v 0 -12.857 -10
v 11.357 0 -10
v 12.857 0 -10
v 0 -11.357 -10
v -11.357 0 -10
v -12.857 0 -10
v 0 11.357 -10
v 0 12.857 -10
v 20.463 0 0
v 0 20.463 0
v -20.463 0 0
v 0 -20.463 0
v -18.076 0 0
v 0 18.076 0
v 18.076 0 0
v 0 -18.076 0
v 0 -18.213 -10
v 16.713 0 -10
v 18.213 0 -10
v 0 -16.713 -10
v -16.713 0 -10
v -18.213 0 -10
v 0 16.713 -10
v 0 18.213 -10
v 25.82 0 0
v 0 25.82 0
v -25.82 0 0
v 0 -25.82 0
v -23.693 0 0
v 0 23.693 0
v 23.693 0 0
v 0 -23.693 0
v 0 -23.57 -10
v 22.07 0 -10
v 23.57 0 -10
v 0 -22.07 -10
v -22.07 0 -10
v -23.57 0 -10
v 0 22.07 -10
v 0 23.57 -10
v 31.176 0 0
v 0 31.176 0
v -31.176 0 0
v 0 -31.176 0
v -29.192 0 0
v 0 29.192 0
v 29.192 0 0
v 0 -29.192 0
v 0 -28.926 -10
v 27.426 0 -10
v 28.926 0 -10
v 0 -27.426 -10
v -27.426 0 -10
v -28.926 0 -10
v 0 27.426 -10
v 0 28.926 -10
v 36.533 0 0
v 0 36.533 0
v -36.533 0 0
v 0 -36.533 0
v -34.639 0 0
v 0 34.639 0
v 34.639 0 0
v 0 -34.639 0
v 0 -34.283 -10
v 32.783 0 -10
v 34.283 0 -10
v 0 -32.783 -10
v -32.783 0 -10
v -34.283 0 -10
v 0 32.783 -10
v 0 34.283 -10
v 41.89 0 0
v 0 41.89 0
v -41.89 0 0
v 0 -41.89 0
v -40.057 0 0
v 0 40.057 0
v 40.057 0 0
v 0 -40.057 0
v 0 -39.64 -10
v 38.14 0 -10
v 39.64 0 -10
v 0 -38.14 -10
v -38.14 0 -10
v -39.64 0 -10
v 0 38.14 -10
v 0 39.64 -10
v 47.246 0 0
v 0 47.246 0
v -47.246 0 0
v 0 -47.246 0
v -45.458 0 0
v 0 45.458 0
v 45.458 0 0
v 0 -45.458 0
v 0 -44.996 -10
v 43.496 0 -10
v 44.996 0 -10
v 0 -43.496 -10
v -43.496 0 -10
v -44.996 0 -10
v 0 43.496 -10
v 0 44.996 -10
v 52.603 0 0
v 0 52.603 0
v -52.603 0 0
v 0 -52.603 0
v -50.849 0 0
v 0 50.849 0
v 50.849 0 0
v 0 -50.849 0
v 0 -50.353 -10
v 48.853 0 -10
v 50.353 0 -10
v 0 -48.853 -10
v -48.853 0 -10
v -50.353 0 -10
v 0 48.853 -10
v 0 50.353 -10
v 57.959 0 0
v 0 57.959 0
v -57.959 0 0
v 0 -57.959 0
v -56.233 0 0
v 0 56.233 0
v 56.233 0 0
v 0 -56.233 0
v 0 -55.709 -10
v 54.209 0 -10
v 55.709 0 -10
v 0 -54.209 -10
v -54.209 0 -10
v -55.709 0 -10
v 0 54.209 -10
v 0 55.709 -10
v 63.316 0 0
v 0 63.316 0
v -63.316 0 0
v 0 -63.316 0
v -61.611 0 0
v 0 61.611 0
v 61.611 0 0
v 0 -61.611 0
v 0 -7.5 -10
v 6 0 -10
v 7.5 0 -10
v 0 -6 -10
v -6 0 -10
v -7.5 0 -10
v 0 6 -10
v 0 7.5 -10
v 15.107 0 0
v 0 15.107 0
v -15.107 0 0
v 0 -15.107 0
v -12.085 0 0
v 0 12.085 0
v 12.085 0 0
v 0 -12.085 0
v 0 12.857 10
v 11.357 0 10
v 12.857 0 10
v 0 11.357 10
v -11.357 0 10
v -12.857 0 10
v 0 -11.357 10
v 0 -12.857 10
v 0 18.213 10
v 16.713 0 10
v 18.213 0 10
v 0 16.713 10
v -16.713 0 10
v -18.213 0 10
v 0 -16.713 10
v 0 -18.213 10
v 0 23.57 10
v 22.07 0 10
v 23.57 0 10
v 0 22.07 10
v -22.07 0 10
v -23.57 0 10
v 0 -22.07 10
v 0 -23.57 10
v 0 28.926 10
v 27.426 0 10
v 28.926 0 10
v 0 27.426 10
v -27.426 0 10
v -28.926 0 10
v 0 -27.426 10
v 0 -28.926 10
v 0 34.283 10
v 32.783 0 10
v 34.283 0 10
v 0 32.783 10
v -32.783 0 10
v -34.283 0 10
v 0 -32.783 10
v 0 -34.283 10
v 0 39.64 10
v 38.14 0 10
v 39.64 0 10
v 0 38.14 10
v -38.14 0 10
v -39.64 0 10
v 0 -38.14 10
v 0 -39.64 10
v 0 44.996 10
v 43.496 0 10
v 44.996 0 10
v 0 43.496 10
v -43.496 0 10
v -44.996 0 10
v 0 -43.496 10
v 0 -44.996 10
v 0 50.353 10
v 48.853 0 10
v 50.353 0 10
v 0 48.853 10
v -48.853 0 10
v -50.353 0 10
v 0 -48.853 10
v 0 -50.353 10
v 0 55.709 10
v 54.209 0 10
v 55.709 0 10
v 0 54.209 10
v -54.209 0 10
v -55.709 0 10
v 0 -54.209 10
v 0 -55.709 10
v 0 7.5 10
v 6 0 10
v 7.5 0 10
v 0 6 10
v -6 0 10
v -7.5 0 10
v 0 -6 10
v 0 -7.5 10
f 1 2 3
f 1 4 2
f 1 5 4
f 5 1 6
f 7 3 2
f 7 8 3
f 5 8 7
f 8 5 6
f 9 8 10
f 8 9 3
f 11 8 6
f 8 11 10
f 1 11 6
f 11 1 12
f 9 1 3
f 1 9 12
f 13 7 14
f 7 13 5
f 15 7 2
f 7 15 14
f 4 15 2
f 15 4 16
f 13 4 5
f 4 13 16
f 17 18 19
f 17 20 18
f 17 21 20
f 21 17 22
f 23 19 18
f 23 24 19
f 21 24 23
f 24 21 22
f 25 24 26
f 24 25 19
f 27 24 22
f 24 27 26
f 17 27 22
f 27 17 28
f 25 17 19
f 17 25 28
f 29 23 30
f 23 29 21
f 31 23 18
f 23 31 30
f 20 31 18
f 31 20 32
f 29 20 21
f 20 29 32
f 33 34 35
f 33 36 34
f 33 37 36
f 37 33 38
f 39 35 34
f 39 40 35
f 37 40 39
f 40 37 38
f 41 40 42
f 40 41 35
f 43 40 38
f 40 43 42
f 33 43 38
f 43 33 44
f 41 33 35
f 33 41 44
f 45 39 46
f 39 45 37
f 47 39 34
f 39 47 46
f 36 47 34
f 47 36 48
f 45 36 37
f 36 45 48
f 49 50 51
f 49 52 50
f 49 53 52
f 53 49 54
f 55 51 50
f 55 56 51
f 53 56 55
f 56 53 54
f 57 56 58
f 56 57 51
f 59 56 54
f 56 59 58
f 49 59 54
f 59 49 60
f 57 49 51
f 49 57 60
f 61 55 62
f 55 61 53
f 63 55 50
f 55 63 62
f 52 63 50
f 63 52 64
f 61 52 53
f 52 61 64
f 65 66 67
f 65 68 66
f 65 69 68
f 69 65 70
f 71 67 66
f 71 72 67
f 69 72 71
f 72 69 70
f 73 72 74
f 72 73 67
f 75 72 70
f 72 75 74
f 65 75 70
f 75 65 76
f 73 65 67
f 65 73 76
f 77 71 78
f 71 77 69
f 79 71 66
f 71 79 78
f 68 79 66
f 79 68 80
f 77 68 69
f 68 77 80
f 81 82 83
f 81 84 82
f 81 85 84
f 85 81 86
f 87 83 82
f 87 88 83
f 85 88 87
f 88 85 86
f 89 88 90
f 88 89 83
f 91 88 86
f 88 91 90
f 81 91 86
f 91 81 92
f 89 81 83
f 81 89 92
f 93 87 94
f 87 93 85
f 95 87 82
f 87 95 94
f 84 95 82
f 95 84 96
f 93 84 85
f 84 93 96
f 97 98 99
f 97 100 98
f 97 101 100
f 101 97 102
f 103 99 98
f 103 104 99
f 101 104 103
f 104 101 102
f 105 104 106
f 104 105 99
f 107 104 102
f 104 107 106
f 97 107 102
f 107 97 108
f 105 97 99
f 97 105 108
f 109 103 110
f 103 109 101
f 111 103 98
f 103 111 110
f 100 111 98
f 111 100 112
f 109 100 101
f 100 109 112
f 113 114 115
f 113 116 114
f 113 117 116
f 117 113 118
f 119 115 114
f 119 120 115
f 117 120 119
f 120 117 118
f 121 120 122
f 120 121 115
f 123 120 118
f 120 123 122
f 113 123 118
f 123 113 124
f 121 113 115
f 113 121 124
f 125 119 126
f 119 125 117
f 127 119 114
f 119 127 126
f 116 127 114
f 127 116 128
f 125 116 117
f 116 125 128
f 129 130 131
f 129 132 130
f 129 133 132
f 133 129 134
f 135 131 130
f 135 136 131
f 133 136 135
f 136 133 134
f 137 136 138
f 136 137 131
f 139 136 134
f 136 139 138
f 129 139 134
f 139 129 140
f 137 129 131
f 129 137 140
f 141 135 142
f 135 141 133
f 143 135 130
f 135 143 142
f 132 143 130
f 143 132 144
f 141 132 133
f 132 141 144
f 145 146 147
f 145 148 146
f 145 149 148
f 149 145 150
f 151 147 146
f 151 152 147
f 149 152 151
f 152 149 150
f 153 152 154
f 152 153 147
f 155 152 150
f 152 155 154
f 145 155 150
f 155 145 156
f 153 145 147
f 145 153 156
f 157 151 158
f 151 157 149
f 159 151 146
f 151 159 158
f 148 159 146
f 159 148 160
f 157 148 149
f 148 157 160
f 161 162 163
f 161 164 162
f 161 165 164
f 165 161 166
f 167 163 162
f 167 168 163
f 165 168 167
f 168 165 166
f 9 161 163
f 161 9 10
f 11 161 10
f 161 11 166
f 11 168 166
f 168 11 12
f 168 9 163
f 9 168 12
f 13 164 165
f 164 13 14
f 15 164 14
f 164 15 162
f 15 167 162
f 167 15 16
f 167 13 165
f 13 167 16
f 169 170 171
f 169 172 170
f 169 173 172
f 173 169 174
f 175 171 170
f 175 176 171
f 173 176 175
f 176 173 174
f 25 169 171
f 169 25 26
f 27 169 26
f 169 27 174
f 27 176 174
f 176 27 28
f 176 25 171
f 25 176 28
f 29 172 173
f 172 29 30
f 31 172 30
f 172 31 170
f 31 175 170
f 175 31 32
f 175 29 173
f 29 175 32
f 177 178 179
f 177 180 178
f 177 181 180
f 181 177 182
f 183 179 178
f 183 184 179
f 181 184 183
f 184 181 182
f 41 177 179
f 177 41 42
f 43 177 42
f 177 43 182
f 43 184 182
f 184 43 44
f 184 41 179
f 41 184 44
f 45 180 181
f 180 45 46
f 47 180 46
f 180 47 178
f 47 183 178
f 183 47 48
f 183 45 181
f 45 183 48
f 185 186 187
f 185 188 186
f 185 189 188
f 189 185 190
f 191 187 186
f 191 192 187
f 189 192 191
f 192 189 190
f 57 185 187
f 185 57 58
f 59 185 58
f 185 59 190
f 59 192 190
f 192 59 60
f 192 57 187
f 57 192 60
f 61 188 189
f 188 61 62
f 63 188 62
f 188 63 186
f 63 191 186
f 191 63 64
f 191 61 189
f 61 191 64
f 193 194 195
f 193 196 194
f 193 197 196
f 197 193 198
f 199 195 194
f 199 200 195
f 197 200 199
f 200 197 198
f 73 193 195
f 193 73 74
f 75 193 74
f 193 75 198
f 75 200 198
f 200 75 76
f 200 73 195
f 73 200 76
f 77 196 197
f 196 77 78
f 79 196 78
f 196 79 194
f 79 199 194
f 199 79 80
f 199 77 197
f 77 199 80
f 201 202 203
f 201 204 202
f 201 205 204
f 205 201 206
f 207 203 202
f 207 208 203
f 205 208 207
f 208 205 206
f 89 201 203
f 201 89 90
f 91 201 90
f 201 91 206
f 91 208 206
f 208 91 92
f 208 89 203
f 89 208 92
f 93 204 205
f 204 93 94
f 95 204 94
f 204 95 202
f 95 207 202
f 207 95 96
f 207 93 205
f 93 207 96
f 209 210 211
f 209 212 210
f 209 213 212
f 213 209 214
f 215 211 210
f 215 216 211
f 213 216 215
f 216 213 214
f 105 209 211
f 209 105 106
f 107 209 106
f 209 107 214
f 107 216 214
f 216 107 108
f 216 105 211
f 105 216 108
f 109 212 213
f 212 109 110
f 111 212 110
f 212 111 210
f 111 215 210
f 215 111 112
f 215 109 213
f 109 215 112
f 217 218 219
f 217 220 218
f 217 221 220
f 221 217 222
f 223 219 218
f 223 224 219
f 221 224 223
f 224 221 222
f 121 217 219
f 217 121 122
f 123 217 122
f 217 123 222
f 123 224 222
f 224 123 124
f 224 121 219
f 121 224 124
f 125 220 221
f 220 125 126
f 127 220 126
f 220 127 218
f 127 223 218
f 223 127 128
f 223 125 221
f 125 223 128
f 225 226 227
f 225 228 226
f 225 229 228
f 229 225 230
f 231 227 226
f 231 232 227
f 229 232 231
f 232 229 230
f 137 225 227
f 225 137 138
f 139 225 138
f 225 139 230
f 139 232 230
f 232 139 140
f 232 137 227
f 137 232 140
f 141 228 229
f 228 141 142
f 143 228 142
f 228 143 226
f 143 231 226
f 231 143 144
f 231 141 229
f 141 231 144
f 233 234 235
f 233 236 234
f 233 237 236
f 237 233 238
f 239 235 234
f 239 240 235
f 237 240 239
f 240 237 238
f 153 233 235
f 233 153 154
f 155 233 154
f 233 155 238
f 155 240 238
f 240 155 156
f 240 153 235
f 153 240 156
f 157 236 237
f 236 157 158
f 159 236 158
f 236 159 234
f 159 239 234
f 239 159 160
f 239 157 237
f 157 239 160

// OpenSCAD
beginning_radius = 7.5;
fn = 4;
number_of_polygons = 10;
height = 20;
thickness = 1.5;
spacing = 0.5 * thickness;
extrude_ratio = 1;

fidget_polygon(beginning_radius, fn, number_of_polygons, height, thickness, spacing, extrude_ratio);

module fidget_polygon(beginning_radius, fn, n, height, thickness, spacing, extrude_ratio) {
    theta = 180 / fn;

	y = beginning_radius - beginning_radius * cos(theta);
	dr = y / cos(theta) + thickness + spacing;
	pw = pow((beginning_radius + dr) * sin(theta), 2);
	
	// function a(ri, ro, i) = acos((pow(ro, 2) + pow(ri, 2) - pw * pow(0.985, i)) / (2 * ro * ri));
	
	module drawPolygon(r) {
		circle(r, $fn = fn);
	}
	
	rs = [for(i = [0: n]) beginning_radius + i * dr];
	//as = [for(i = [1: n]) a(rs[i - 1], rs[i], i) / 2];

	s = [for(i = [1: n]) (rs[i] + thickness + spacing) / rs[i - 1]] * extrude_ratio;
	
	half_height = height / 2;

	module half() {
	    translate([0, 0, -half_height]) {
			linear_extrude(half_height, scale = s[0])
			difference() {
				drawPolygon(beginning_radius);
				drawPolygon(beginning_radius - thickness);
			}
				
			for(i = [1:n - 1]) {
				//rotate(as[i] * 2)
				linear_extrude(half_height, scale = s[i])
				difference() {
					drawPolygon(rs[i]);
					drawPolygon(rs[i] - thickness);
				}					
			}
		}
	}
	
	half();	
	mirror([0, 0, 1])
	    half();
}
